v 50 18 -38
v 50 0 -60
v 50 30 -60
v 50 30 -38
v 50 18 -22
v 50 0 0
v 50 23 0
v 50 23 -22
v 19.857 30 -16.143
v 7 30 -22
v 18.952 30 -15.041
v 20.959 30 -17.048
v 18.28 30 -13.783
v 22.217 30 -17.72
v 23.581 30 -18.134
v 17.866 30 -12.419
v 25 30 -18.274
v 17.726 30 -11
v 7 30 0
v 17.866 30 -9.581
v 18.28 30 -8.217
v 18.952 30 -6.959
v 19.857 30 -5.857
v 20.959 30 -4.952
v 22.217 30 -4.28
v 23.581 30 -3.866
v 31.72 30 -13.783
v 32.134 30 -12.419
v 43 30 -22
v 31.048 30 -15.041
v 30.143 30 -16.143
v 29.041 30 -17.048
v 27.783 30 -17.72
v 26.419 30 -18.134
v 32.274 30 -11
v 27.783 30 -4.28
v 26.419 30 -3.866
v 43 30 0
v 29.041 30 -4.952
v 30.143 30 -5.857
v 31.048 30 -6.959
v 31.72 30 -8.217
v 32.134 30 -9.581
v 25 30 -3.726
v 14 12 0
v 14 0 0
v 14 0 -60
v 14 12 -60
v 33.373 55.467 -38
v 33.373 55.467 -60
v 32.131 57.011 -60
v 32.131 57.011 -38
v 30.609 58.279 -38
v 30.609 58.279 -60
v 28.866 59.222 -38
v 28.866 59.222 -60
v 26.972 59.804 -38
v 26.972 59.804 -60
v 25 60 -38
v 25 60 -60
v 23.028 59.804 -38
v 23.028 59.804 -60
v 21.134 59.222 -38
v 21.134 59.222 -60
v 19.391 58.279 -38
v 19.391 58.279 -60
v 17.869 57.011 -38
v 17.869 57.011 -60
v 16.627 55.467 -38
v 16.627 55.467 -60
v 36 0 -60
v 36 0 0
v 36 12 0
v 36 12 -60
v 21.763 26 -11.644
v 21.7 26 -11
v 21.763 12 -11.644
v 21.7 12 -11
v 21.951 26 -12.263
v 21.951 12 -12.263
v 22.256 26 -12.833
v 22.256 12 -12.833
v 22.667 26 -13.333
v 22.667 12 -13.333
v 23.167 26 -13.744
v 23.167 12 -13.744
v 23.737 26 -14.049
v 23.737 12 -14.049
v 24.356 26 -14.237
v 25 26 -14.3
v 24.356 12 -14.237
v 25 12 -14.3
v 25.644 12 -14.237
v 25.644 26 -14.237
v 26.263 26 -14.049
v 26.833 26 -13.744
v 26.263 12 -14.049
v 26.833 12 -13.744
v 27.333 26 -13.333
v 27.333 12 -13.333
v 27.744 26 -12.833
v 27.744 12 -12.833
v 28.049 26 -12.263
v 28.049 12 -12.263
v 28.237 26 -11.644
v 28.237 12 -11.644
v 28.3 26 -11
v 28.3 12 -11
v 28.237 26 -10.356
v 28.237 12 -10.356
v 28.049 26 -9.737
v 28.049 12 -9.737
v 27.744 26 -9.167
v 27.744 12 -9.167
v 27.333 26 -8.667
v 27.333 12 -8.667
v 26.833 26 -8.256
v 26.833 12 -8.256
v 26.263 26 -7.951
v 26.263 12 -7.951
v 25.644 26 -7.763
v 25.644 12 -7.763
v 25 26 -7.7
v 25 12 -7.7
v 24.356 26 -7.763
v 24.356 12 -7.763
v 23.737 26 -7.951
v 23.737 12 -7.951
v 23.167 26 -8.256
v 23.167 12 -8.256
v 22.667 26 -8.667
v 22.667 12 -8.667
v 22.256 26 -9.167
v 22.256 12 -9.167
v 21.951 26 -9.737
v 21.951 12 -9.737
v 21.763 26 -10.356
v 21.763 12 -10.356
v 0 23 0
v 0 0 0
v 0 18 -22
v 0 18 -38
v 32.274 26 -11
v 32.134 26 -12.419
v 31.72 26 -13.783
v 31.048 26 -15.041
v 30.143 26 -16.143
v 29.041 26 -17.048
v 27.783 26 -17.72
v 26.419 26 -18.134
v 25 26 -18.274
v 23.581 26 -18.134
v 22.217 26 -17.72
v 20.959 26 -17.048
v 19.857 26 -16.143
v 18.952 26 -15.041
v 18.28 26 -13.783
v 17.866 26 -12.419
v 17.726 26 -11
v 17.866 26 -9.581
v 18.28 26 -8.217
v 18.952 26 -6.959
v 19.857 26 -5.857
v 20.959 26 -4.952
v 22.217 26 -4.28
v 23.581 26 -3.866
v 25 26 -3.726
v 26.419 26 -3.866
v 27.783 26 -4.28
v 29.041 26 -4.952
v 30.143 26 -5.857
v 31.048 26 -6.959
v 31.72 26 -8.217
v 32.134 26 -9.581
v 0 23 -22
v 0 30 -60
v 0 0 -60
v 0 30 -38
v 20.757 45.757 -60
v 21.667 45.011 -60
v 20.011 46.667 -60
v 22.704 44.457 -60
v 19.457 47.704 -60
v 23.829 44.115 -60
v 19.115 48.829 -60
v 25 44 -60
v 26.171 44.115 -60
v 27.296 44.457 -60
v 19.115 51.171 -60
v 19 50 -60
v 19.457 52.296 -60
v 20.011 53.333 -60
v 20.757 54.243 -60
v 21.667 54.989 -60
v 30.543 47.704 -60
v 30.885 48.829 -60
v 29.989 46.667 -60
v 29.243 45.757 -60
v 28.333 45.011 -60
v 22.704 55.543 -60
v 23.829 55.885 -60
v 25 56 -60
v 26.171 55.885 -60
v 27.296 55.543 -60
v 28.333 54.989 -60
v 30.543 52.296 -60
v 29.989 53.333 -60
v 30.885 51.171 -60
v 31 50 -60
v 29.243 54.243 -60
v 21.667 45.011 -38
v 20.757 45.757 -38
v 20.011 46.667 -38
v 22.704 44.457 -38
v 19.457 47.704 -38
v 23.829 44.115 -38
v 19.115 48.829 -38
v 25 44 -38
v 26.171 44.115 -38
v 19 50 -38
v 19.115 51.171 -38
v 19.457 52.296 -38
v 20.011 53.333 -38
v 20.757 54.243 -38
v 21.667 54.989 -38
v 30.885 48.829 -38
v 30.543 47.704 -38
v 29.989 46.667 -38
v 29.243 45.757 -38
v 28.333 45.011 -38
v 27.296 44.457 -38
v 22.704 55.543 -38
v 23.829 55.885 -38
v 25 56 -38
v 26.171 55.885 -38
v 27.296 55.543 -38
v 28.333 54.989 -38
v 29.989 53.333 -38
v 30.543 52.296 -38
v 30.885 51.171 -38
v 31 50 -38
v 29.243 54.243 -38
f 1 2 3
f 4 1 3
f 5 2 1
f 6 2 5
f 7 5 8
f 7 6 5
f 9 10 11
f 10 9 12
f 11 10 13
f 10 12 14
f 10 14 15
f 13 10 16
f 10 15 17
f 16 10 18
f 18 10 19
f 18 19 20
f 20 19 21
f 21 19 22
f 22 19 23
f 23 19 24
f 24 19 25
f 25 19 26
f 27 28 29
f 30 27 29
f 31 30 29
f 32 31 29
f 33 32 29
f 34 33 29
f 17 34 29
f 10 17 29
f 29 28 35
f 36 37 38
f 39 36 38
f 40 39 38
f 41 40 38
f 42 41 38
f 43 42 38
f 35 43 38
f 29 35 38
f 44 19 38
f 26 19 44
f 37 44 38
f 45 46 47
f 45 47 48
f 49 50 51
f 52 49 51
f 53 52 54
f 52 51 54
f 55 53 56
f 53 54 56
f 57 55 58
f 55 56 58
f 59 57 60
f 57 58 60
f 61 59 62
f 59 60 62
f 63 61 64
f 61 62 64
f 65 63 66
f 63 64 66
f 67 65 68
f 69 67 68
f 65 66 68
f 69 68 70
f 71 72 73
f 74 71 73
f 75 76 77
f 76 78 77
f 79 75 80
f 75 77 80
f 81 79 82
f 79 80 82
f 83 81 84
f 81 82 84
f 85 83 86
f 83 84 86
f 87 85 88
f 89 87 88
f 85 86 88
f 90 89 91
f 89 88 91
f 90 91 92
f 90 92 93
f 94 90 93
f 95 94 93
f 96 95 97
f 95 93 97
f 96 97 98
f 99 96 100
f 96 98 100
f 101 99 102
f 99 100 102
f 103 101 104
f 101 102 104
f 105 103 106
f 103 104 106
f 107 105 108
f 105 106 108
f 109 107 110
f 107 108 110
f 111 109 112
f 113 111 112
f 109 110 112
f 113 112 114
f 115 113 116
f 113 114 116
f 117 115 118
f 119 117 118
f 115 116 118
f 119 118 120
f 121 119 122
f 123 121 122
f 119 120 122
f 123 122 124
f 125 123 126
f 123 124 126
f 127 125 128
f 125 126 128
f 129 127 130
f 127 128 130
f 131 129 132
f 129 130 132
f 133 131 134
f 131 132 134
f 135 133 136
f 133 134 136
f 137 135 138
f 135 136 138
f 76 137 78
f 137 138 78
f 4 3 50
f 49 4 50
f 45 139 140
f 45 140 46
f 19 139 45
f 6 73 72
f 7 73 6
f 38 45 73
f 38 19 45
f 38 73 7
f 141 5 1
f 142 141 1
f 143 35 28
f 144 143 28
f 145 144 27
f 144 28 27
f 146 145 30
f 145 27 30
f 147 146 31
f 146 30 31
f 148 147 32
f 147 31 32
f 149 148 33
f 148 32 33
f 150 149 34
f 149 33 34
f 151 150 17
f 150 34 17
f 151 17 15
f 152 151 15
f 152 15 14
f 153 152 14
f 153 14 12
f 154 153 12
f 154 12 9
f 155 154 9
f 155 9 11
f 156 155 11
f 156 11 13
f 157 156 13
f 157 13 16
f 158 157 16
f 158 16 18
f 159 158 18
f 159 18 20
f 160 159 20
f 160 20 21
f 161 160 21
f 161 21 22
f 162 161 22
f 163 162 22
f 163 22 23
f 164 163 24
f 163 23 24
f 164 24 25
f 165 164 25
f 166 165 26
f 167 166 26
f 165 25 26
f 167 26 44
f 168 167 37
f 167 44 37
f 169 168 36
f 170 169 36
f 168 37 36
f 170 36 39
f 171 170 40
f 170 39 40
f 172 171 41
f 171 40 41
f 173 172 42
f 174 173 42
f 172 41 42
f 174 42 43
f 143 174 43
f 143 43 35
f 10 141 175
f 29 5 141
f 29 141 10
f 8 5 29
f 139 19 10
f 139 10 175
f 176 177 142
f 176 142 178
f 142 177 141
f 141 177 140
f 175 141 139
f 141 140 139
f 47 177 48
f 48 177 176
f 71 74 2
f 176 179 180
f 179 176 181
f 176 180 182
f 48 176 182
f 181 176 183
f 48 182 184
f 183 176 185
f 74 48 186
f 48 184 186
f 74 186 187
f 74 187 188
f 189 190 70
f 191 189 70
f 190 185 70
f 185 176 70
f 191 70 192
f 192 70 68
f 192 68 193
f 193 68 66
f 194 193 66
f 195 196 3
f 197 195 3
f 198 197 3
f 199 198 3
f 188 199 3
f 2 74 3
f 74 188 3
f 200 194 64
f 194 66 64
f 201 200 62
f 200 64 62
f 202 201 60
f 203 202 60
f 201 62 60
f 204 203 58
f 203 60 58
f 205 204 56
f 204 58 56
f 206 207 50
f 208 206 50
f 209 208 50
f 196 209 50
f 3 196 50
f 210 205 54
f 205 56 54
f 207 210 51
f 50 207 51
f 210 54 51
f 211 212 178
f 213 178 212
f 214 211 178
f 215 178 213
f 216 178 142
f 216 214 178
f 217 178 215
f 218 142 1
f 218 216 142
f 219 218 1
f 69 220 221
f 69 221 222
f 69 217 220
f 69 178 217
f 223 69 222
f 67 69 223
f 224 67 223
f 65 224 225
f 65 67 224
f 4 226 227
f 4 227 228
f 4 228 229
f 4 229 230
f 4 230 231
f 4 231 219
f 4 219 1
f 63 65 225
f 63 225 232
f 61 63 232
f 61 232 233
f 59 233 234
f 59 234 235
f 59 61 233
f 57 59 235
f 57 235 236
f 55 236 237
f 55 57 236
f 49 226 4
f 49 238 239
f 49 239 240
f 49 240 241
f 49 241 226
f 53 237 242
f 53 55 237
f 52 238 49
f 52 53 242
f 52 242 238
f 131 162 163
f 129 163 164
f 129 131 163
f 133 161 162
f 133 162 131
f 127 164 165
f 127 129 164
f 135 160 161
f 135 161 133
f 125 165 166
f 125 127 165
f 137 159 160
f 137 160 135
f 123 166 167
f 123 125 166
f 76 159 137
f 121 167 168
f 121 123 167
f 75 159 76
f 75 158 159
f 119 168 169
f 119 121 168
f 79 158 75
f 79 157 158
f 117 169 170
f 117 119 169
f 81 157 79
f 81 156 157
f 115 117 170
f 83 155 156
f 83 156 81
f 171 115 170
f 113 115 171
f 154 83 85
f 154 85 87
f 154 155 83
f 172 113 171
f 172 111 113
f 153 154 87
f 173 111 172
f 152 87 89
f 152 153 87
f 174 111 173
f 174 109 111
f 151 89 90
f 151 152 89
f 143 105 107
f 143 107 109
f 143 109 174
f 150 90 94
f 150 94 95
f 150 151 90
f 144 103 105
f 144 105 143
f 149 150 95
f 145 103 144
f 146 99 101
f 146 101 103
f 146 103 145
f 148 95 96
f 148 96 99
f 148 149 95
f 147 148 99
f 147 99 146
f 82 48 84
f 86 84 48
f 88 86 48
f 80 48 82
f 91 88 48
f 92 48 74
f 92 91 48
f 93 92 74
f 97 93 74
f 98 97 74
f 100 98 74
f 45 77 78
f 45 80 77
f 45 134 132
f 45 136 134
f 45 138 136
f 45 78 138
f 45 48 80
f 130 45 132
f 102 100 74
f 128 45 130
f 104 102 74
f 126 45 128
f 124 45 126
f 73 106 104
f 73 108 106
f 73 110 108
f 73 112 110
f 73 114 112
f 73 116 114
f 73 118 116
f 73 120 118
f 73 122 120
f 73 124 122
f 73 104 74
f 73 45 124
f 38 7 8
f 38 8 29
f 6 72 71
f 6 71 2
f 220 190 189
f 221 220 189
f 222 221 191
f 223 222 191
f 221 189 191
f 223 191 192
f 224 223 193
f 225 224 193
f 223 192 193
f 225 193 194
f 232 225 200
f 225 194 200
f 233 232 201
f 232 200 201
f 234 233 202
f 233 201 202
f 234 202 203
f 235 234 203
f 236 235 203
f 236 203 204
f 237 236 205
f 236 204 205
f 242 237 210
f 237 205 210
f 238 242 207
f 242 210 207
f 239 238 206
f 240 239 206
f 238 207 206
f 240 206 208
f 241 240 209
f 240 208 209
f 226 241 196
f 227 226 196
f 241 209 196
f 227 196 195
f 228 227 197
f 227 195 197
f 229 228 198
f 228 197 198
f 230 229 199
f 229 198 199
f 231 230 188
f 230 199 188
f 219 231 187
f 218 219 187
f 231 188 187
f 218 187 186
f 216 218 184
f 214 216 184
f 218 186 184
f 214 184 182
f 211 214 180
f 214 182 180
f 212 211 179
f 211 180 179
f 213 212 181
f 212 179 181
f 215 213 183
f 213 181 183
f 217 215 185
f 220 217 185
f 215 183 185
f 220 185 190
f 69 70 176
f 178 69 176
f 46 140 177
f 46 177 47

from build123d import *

# Parameters (mm, degrees)
SKETCH1_W                               = 50
SKETCH1_H                               = 30
BOSS_EXTRUDE1_DEPTH                     = 60
SKETCH2_R                               = 6
BOSS_EXTRUDE2_DEPTH                     = 22
SKETCH3_W                               = 16
SKETCH3_H                               = 12
CUT_EXTRUDE1_DEPTH                      = 99.488578018
SKETCH4_W                               = 22
SKETCH4_H                               = 12
CUT_EXTRUDE2_DEPTH                      = 99.488578018
CUT_EXTRUDE3_REACH                      = 100.489
CBORE_FOR_M6_HEX_HEAD_BOLT2_D           = 6.6
CBORE_FOR_M6_HEX_HEAD_BOLT2_CBORE_D     = 14.547
CBORE_FOR_M6_HEX_HEAD_BOLT2_CBORE_DEPTH = 4


with BuildPart() as part:
    # Sketch1 → Boss-Extrude1 (new body)
    with BuildSketch(Plane.XY):
        with Locations((25, 15)):
            Rectangle(SKETCH1_W, SKETCH1_H)
    extrude(amount=-BOSS_EXTRUDE1_DEPTH)

    # Sketch2 → Boss-Extrude2 (add)
    with BuildSketch(Plane(origin=(0, 0, -60), x_dir=(-1, 0, 0), z_dir=(0, 0, -1))):
        with BuildLine():
            Line((-50, 30), (-33.373426859, 55.466783574))
            ThreePointArc((-33.373426859, 55.466783574), (-25, 60), (-16.626573141, 55.466783574))
            Line((-16.626573141, 55.466783574), (0, 30))
            Line((0, 30), (-50, 30))
        make_face()
        with Locations((-25, 50)):
            Circle(SKETCH2_R, mode=Mode.SUBTRACT)
    extrude(amount=-BOSS_EXTRUDE2_DEPTH)

    # Sketch3 → Cut-Extrude1 (cut, through all)
    with BuildSketch(Plane(origin=(50, 0, 0), x_dir=(0, 0, -1), z_dir=(1, 0, 0))):
        with Locations((30, 24)):
            Rectangle(SKETCH3_W, SKETCH3_H)
    extrude(amount=-CUT_EXTRUDE1_DEPTH, mode=Mode.SUBTRACT)

    # Sketch4 → Cut-Extrude2 (cut, through all)
    with BuildSketch(Plane.XY):
        with Locations((25, 6)):
            Rectangle(SKETCH4_W, SKETCH4_H)
    extrude(amount=-CUT_EXTRUDE2_DEPTH, mode=Mode.SUBTRACT)

    # Sketch5 → Cut-Extrude3 (cut, up to next)
    with BuildSketch(Plane.XY, mode=Mode.PRIVATE) as cut_extrude3_sk1:
        Polygon((50, 30), (50, 23), (43, 30), align=None)
    cut_extrude3_tool1 = extrude(cut_extrude3_sk1.sketch, amount=-CUT_EXTRUDE3_REACH, mode=Mode.PRIVATE) & part.part
    # Sketch5 → Cut-Extrude3 (cut, up to next)
    with BuildSketch(Plane.XY, mode=Mode.PRIVATE) as cut_extrude3_sk2:
        Polygon((0, 23), (0, 30), (7, 30), align=None)
    cut_extrude3_tool2 = extrude(cut_extrude3_sk2.sketch, amount=-CUT_EXTRUDE3_REACH, mode=Mode.PRIVATE) & part.part
    add(cut_extrude3_tool1.solids().sort_by_distance((47.666667, 27.666667, 0))[0], mode=Mode.SUBTRACT)
    add(cut_extrude3_tool2.solids().sort_by_distance((2.333333, 27.666667, 0))[0], mode=Mode.SUBTRACT)

    # CBORE for M6 Hex Head Bolt2 (through all)
    with Locations(Plane(origin=(0, 30, 0), x_dir=(1, 0, 0), z_dir=(0, 1, 0))):
        with Locations((25, 11)):
            CounterBoreHole(CBORE_FOR_M6_HEX_HEAD_BOLT2_D / 2, CBORE_FOR_M6_HEX_HEAD_BOLT2_CBORE_D / 2, CBORE_FOR_M6_HEX_HEAD_BOLT2_CBORE_DEPTH)


solid = part.part
